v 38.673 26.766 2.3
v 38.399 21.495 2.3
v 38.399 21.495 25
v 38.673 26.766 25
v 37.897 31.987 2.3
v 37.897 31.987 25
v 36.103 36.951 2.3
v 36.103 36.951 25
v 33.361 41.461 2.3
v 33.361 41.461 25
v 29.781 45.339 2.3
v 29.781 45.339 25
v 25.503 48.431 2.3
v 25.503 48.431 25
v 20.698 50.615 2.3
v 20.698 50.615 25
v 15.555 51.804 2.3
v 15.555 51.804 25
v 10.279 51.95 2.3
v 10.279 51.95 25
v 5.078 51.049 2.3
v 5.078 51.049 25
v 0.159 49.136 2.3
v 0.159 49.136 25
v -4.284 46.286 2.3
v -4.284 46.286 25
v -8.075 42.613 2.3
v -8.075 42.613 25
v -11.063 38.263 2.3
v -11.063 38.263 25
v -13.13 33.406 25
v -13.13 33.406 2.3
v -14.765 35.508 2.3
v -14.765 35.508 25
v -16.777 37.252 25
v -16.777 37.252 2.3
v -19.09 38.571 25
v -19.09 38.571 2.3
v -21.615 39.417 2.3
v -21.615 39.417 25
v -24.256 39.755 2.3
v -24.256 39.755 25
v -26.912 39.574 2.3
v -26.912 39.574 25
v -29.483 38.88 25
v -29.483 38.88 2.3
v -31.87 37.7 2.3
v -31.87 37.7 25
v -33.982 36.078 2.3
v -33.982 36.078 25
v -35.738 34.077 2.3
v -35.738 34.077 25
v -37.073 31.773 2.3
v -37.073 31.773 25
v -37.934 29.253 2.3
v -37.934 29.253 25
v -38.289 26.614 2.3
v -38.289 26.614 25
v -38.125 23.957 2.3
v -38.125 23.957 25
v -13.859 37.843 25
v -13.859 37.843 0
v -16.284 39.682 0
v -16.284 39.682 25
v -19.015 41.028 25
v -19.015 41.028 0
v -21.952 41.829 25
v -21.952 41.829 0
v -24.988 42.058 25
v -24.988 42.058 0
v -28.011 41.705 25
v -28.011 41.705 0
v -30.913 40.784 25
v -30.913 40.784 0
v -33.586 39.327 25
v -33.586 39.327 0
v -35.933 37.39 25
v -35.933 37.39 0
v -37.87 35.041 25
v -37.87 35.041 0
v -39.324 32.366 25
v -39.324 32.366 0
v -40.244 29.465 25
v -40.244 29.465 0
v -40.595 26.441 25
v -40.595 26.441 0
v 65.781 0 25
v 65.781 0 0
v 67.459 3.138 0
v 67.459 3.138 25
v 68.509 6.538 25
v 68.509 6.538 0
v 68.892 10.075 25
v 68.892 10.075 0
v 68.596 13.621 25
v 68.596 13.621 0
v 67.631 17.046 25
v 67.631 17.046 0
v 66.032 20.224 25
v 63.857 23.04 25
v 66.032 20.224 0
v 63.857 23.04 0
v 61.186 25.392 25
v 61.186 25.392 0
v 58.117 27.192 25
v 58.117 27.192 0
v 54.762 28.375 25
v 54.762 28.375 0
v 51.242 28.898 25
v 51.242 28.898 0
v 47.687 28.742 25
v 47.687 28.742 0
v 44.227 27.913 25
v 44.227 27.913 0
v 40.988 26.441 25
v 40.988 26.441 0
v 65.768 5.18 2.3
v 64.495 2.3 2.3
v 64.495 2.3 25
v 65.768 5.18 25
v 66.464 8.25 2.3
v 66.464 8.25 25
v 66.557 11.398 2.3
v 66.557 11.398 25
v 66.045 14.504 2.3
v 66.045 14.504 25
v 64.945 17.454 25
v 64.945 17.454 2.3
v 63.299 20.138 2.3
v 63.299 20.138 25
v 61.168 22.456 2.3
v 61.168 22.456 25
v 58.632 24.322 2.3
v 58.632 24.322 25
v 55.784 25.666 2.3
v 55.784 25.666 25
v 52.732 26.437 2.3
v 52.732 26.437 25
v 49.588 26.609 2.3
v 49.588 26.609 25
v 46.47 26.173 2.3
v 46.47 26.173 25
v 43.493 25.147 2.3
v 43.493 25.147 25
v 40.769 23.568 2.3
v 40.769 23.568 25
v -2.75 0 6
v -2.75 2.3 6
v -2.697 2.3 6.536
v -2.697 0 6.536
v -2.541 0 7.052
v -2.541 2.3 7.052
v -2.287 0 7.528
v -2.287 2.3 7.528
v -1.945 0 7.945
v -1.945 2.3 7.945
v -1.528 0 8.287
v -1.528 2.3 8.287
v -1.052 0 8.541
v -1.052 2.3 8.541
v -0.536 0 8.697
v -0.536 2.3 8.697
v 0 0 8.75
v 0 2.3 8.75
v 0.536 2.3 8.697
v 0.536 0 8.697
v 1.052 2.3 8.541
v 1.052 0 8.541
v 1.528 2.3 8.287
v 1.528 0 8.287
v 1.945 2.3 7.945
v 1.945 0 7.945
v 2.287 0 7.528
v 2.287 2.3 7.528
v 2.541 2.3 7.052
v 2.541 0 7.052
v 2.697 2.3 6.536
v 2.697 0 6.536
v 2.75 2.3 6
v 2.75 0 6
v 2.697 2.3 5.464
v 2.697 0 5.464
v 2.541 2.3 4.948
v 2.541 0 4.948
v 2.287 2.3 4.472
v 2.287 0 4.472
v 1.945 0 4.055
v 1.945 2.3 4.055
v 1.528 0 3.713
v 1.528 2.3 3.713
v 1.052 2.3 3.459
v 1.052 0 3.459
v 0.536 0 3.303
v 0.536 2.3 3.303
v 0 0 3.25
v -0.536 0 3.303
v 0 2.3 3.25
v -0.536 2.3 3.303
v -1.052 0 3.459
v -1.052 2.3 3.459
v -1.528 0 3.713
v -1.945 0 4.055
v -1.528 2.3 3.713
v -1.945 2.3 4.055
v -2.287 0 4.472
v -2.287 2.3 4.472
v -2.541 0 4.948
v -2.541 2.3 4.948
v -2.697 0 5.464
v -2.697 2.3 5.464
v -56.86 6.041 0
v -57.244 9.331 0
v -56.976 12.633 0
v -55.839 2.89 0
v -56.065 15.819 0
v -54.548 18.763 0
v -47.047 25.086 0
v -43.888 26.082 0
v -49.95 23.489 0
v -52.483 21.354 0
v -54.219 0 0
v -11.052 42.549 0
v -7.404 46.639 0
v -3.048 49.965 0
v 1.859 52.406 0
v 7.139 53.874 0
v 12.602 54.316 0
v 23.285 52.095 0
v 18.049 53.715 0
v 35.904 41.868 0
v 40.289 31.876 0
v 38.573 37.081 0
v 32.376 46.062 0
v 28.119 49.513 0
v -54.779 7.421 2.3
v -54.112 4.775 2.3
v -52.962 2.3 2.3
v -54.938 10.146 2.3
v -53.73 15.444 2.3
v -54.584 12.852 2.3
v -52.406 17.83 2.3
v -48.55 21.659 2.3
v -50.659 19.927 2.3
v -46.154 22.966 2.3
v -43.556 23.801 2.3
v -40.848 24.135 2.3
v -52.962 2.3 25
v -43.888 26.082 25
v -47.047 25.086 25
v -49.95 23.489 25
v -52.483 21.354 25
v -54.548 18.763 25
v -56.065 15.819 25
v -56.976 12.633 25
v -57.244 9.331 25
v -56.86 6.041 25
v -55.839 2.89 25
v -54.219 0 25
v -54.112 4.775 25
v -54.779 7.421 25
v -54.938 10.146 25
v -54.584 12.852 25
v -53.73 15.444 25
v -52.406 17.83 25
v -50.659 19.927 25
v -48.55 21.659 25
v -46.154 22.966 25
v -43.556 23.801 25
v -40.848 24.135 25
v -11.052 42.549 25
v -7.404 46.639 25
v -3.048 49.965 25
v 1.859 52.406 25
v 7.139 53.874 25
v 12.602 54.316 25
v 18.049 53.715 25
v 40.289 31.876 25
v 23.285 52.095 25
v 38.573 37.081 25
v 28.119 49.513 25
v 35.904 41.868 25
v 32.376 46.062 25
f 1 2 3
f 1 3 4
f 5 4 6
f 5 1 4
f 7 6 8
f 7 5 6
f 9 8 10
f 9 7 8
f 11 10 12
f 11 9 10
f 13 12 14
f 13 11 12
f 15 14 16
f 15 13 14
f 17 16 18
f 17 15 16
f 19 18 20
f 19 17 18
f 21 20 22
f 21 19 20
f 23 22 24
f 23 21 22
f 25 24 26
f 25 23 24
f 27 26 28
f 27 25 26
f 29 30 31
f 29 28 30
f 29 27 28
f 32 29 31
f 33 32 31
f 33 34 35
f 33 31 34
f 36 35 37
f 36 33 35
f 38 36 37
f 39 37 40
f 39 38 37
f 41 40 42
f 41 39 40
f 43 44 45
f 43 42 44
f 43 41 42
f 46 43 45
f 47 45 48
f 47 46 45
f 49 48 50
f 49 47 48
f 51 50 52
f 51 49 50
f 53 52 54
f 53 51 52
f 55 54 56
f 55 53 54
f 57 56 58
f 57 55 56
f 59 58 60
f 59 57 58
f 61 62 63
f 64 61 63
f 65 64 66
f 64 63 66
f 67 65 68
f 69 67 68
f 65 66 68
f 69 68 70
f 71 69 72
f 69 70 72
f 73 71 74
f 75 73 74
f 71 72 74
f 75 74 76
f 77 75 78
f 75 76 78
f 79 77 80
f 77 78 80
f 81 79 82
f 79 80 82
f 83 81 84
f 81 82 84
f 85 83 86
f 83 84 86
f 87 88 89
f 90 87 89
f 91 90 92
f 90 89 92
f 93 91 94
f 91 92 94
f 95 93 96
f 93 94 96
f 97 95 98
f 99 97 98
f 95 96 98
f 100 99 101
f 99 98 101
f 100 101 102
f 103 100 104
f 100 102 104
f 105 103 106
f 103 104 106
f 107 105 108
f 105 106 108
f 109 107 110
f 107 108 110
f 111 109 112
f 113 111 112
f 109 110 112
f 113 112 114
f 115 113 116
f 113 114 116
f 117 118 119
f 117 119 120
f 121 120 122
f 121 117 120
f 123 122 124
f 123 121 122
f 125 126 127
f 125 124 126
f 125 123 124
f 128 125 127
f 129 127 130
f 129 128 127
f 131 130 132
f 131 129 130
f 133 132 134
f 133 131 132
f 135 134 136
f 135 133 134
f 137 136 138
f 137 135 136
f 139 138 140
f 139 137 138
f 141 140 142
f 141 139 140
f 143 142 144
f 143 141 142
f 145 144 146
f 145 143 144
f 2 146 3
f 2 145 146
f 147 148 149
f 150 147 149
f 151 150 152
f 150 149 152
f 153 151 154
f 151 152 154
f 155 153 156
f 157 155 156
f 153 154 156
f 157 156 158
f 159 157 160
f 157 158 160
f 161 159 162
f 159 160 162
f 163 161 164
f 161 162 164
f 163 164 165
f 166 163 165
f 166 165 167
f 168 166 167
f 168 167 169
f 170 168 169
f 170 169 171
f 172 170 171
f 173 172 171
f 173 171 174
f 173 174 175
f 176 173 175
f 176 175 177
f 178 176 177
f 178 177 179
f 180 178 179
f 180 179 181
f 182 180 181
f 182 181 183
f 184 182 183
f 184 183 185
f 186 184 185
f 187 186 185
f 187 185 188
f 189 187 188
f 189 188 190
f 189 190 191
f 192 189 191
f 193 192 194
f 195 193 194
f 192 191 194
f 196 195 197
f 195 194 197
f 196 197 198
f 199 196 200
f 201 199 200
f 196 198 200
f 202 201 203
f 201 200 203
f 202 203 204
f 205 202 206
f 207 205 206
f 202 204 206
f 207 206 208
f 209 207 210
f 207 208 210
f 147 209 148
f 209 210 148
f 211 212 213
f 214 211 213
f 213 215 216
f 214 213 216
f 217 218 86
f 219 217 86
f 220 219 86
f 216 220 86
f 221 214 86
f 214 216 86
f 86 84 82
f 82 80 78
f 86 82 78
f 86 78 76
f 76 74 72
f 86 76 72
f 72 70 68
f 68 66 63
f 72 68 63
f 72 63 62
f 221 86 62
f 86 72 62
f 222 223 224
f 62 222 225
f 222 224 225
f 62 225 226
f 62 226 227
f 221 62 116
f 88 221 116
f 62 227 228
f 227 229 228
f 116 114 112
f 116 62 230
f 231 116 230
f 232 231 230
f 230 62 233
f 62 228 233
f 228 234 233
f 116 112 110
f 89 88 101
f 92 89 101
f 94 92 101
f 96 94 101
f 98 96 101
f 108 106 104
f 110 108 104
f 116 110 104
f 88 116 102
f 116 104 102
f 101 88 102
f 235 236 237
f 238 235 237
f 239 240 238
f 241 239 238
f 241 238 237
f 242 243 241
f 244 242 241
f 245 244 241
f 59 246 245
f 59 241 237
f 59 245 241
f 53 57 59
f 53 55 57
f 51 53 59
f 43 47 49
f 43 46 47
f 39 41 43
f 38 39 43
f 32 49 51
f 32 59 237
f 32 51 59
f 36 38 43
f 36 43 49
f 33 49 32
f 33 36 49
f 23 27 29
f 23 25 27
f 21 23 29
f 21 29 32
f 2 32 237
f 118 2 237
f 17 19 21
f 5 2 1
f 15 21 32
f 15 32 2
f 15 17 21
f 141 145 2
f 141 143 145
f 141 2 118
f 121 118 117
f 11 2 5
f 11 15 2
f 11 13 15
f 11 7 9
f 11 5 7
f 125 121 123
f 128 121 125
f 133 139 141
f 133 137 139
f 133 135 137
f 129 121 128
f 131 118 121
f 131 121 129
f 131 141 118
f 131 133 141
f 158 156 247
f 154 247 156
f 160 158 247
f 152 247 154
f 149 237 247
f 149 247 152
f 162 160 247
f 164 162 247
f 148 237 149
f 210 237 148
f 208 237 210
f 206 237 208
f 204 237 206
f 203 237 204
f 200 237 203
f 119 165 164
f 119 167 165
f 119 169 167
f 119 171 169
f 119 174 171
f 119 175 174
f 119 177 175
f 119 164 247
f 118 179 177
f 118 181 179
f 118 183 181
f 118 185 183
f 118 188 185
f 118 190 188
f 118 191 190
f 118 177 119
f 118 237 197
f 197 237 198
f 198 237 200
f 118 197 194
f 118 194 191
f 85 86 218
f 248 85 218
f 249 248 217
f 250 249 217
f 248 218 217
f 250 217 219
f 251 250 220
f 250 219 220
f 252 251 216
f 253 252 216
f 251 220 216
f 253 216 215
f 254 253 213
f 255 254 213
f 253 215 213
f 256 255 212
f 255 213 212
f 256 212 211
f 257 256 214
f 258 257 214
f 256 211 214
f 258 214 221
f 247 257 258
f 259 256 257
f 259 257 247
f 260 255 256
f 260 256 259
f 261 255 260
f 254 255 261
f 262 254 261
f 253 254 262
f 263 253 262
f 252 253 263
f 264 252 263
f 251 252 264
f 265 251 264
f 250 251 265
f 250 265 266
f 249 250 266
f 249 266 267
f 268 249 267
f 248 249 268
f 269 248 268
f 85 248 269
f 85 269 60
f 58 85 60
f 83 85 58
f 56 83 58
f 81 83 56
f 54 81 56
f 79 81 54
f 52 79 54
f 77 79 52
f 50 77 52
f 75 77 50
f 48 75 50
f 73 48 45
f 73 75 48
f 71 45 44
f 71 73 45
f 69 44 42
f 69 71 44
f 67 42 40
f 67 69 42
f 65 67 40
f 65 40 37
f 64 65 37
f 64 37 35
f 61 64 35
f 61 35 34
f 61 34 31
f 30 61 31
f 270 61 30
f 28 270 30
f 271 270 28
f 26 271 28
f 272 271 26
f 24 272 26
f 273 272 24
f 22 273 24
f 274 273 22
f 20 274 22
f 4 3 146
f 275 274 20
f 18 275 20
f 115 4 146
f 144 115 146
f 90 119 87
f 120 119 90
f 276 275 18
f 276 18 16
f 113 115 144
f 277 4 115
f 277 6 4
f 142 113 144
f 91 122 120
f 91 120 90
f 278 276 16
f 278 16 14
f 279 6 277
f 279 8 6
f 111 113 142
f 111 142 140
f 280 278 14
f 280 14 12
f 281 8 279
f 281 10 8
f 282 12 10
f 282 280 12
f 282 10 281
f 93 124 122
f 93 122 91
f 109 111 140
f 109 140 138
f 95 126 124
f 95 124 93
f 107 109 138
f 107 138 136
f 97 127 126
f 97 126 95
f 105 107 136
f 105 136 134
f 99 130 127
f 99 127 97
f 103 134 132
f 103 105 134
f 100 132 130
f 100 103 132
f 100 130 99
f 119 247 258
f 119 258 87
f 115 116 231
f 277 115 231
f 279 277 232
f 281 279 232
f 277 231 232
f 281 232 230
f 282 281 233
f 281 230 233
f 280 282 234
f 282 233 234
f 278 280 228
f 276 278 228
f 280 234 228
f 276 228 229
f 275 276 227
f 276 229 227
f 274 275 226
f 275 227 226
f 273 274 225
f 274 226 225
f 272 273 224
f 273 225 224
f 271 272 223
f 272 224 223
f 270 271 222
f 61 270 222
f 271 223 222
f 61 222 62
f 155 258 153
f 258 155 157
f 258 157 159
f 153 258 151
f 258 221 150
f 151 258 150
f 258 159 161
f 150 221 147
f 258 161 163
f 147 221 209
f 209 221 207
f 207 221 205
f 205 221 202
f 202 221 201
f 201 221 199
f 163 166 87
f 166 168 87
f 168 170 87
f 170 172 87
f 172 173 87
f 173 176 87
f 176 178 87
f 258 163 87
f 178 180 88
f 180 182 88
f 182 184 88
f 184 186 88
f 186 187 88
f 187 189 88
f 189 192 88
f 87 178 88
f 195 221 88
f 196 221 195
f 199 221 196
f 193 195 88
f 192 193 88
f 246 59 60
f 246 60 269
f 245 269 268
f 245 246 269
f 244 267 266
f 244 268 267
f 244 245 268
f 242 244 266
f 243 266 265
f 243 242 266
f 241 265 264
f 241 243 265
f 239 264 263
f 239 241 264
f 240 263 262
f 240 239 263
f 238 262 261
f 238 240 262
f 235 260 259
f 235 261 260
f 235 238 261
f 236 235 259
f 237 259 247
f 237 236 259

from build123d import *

# Parameters (mm, degrees)
F1_DEPTH = 25
F2_T     = -2.3
F4_D     = 5.5
F4_DEPTH = 12
F4_TIP   = 1.6523667023


with BuildPart() as f1:
    # F0 (on Top) → F1 (new body)
    with BuildSketch(Plane.XY):
        with BuildLine():
            ThreePointArc((-40.594752878, 26.4406520873), (-55.3794762118, 17.3284085078), (-54.2187498458, 0))
            Line((-54.2187498458, 0), (65.7812501542, 0))
            ThreePointArc((65.7812501542, 0), (63.8571902729, 23.0404540262), (40.9879274666, 26.4406520873))
            ThreePointArc((40.9879274666, 26.4406520873), (18.0492419713, 53.7154868807), (-13.8592263684, 37.8425680101))
            ThreePointArc((-13.8592263684, 37.8425680101), (-30.9125269305, 40.7835594412), (-40.594752878, 26.4406520873))
        make_face()
    extrude(amount=F1_DEPTH)

    # F2
    f2_openings = [f1.faces().sort_by_distance(p)[0] for p in [
        (5.721162, 21.020998, 25),
    ]]
    offset(amount=F2_T, openings=f2_openings, kind=Kind.INTERSECTION)

    # F4
    with Locations(Plane.XZ):
        with Locations((0, 6)):
            Hole(F4_D / 2, depth=F4_DEPTH)
            with Locations((0, 0, -(F4_DEPTH + F4_TIP / 2))):  # 118° drill point
                Cone(0, F4_D / 2, F4_TIP, mode=Mode.SUBTRACT)


solid = f1.part
